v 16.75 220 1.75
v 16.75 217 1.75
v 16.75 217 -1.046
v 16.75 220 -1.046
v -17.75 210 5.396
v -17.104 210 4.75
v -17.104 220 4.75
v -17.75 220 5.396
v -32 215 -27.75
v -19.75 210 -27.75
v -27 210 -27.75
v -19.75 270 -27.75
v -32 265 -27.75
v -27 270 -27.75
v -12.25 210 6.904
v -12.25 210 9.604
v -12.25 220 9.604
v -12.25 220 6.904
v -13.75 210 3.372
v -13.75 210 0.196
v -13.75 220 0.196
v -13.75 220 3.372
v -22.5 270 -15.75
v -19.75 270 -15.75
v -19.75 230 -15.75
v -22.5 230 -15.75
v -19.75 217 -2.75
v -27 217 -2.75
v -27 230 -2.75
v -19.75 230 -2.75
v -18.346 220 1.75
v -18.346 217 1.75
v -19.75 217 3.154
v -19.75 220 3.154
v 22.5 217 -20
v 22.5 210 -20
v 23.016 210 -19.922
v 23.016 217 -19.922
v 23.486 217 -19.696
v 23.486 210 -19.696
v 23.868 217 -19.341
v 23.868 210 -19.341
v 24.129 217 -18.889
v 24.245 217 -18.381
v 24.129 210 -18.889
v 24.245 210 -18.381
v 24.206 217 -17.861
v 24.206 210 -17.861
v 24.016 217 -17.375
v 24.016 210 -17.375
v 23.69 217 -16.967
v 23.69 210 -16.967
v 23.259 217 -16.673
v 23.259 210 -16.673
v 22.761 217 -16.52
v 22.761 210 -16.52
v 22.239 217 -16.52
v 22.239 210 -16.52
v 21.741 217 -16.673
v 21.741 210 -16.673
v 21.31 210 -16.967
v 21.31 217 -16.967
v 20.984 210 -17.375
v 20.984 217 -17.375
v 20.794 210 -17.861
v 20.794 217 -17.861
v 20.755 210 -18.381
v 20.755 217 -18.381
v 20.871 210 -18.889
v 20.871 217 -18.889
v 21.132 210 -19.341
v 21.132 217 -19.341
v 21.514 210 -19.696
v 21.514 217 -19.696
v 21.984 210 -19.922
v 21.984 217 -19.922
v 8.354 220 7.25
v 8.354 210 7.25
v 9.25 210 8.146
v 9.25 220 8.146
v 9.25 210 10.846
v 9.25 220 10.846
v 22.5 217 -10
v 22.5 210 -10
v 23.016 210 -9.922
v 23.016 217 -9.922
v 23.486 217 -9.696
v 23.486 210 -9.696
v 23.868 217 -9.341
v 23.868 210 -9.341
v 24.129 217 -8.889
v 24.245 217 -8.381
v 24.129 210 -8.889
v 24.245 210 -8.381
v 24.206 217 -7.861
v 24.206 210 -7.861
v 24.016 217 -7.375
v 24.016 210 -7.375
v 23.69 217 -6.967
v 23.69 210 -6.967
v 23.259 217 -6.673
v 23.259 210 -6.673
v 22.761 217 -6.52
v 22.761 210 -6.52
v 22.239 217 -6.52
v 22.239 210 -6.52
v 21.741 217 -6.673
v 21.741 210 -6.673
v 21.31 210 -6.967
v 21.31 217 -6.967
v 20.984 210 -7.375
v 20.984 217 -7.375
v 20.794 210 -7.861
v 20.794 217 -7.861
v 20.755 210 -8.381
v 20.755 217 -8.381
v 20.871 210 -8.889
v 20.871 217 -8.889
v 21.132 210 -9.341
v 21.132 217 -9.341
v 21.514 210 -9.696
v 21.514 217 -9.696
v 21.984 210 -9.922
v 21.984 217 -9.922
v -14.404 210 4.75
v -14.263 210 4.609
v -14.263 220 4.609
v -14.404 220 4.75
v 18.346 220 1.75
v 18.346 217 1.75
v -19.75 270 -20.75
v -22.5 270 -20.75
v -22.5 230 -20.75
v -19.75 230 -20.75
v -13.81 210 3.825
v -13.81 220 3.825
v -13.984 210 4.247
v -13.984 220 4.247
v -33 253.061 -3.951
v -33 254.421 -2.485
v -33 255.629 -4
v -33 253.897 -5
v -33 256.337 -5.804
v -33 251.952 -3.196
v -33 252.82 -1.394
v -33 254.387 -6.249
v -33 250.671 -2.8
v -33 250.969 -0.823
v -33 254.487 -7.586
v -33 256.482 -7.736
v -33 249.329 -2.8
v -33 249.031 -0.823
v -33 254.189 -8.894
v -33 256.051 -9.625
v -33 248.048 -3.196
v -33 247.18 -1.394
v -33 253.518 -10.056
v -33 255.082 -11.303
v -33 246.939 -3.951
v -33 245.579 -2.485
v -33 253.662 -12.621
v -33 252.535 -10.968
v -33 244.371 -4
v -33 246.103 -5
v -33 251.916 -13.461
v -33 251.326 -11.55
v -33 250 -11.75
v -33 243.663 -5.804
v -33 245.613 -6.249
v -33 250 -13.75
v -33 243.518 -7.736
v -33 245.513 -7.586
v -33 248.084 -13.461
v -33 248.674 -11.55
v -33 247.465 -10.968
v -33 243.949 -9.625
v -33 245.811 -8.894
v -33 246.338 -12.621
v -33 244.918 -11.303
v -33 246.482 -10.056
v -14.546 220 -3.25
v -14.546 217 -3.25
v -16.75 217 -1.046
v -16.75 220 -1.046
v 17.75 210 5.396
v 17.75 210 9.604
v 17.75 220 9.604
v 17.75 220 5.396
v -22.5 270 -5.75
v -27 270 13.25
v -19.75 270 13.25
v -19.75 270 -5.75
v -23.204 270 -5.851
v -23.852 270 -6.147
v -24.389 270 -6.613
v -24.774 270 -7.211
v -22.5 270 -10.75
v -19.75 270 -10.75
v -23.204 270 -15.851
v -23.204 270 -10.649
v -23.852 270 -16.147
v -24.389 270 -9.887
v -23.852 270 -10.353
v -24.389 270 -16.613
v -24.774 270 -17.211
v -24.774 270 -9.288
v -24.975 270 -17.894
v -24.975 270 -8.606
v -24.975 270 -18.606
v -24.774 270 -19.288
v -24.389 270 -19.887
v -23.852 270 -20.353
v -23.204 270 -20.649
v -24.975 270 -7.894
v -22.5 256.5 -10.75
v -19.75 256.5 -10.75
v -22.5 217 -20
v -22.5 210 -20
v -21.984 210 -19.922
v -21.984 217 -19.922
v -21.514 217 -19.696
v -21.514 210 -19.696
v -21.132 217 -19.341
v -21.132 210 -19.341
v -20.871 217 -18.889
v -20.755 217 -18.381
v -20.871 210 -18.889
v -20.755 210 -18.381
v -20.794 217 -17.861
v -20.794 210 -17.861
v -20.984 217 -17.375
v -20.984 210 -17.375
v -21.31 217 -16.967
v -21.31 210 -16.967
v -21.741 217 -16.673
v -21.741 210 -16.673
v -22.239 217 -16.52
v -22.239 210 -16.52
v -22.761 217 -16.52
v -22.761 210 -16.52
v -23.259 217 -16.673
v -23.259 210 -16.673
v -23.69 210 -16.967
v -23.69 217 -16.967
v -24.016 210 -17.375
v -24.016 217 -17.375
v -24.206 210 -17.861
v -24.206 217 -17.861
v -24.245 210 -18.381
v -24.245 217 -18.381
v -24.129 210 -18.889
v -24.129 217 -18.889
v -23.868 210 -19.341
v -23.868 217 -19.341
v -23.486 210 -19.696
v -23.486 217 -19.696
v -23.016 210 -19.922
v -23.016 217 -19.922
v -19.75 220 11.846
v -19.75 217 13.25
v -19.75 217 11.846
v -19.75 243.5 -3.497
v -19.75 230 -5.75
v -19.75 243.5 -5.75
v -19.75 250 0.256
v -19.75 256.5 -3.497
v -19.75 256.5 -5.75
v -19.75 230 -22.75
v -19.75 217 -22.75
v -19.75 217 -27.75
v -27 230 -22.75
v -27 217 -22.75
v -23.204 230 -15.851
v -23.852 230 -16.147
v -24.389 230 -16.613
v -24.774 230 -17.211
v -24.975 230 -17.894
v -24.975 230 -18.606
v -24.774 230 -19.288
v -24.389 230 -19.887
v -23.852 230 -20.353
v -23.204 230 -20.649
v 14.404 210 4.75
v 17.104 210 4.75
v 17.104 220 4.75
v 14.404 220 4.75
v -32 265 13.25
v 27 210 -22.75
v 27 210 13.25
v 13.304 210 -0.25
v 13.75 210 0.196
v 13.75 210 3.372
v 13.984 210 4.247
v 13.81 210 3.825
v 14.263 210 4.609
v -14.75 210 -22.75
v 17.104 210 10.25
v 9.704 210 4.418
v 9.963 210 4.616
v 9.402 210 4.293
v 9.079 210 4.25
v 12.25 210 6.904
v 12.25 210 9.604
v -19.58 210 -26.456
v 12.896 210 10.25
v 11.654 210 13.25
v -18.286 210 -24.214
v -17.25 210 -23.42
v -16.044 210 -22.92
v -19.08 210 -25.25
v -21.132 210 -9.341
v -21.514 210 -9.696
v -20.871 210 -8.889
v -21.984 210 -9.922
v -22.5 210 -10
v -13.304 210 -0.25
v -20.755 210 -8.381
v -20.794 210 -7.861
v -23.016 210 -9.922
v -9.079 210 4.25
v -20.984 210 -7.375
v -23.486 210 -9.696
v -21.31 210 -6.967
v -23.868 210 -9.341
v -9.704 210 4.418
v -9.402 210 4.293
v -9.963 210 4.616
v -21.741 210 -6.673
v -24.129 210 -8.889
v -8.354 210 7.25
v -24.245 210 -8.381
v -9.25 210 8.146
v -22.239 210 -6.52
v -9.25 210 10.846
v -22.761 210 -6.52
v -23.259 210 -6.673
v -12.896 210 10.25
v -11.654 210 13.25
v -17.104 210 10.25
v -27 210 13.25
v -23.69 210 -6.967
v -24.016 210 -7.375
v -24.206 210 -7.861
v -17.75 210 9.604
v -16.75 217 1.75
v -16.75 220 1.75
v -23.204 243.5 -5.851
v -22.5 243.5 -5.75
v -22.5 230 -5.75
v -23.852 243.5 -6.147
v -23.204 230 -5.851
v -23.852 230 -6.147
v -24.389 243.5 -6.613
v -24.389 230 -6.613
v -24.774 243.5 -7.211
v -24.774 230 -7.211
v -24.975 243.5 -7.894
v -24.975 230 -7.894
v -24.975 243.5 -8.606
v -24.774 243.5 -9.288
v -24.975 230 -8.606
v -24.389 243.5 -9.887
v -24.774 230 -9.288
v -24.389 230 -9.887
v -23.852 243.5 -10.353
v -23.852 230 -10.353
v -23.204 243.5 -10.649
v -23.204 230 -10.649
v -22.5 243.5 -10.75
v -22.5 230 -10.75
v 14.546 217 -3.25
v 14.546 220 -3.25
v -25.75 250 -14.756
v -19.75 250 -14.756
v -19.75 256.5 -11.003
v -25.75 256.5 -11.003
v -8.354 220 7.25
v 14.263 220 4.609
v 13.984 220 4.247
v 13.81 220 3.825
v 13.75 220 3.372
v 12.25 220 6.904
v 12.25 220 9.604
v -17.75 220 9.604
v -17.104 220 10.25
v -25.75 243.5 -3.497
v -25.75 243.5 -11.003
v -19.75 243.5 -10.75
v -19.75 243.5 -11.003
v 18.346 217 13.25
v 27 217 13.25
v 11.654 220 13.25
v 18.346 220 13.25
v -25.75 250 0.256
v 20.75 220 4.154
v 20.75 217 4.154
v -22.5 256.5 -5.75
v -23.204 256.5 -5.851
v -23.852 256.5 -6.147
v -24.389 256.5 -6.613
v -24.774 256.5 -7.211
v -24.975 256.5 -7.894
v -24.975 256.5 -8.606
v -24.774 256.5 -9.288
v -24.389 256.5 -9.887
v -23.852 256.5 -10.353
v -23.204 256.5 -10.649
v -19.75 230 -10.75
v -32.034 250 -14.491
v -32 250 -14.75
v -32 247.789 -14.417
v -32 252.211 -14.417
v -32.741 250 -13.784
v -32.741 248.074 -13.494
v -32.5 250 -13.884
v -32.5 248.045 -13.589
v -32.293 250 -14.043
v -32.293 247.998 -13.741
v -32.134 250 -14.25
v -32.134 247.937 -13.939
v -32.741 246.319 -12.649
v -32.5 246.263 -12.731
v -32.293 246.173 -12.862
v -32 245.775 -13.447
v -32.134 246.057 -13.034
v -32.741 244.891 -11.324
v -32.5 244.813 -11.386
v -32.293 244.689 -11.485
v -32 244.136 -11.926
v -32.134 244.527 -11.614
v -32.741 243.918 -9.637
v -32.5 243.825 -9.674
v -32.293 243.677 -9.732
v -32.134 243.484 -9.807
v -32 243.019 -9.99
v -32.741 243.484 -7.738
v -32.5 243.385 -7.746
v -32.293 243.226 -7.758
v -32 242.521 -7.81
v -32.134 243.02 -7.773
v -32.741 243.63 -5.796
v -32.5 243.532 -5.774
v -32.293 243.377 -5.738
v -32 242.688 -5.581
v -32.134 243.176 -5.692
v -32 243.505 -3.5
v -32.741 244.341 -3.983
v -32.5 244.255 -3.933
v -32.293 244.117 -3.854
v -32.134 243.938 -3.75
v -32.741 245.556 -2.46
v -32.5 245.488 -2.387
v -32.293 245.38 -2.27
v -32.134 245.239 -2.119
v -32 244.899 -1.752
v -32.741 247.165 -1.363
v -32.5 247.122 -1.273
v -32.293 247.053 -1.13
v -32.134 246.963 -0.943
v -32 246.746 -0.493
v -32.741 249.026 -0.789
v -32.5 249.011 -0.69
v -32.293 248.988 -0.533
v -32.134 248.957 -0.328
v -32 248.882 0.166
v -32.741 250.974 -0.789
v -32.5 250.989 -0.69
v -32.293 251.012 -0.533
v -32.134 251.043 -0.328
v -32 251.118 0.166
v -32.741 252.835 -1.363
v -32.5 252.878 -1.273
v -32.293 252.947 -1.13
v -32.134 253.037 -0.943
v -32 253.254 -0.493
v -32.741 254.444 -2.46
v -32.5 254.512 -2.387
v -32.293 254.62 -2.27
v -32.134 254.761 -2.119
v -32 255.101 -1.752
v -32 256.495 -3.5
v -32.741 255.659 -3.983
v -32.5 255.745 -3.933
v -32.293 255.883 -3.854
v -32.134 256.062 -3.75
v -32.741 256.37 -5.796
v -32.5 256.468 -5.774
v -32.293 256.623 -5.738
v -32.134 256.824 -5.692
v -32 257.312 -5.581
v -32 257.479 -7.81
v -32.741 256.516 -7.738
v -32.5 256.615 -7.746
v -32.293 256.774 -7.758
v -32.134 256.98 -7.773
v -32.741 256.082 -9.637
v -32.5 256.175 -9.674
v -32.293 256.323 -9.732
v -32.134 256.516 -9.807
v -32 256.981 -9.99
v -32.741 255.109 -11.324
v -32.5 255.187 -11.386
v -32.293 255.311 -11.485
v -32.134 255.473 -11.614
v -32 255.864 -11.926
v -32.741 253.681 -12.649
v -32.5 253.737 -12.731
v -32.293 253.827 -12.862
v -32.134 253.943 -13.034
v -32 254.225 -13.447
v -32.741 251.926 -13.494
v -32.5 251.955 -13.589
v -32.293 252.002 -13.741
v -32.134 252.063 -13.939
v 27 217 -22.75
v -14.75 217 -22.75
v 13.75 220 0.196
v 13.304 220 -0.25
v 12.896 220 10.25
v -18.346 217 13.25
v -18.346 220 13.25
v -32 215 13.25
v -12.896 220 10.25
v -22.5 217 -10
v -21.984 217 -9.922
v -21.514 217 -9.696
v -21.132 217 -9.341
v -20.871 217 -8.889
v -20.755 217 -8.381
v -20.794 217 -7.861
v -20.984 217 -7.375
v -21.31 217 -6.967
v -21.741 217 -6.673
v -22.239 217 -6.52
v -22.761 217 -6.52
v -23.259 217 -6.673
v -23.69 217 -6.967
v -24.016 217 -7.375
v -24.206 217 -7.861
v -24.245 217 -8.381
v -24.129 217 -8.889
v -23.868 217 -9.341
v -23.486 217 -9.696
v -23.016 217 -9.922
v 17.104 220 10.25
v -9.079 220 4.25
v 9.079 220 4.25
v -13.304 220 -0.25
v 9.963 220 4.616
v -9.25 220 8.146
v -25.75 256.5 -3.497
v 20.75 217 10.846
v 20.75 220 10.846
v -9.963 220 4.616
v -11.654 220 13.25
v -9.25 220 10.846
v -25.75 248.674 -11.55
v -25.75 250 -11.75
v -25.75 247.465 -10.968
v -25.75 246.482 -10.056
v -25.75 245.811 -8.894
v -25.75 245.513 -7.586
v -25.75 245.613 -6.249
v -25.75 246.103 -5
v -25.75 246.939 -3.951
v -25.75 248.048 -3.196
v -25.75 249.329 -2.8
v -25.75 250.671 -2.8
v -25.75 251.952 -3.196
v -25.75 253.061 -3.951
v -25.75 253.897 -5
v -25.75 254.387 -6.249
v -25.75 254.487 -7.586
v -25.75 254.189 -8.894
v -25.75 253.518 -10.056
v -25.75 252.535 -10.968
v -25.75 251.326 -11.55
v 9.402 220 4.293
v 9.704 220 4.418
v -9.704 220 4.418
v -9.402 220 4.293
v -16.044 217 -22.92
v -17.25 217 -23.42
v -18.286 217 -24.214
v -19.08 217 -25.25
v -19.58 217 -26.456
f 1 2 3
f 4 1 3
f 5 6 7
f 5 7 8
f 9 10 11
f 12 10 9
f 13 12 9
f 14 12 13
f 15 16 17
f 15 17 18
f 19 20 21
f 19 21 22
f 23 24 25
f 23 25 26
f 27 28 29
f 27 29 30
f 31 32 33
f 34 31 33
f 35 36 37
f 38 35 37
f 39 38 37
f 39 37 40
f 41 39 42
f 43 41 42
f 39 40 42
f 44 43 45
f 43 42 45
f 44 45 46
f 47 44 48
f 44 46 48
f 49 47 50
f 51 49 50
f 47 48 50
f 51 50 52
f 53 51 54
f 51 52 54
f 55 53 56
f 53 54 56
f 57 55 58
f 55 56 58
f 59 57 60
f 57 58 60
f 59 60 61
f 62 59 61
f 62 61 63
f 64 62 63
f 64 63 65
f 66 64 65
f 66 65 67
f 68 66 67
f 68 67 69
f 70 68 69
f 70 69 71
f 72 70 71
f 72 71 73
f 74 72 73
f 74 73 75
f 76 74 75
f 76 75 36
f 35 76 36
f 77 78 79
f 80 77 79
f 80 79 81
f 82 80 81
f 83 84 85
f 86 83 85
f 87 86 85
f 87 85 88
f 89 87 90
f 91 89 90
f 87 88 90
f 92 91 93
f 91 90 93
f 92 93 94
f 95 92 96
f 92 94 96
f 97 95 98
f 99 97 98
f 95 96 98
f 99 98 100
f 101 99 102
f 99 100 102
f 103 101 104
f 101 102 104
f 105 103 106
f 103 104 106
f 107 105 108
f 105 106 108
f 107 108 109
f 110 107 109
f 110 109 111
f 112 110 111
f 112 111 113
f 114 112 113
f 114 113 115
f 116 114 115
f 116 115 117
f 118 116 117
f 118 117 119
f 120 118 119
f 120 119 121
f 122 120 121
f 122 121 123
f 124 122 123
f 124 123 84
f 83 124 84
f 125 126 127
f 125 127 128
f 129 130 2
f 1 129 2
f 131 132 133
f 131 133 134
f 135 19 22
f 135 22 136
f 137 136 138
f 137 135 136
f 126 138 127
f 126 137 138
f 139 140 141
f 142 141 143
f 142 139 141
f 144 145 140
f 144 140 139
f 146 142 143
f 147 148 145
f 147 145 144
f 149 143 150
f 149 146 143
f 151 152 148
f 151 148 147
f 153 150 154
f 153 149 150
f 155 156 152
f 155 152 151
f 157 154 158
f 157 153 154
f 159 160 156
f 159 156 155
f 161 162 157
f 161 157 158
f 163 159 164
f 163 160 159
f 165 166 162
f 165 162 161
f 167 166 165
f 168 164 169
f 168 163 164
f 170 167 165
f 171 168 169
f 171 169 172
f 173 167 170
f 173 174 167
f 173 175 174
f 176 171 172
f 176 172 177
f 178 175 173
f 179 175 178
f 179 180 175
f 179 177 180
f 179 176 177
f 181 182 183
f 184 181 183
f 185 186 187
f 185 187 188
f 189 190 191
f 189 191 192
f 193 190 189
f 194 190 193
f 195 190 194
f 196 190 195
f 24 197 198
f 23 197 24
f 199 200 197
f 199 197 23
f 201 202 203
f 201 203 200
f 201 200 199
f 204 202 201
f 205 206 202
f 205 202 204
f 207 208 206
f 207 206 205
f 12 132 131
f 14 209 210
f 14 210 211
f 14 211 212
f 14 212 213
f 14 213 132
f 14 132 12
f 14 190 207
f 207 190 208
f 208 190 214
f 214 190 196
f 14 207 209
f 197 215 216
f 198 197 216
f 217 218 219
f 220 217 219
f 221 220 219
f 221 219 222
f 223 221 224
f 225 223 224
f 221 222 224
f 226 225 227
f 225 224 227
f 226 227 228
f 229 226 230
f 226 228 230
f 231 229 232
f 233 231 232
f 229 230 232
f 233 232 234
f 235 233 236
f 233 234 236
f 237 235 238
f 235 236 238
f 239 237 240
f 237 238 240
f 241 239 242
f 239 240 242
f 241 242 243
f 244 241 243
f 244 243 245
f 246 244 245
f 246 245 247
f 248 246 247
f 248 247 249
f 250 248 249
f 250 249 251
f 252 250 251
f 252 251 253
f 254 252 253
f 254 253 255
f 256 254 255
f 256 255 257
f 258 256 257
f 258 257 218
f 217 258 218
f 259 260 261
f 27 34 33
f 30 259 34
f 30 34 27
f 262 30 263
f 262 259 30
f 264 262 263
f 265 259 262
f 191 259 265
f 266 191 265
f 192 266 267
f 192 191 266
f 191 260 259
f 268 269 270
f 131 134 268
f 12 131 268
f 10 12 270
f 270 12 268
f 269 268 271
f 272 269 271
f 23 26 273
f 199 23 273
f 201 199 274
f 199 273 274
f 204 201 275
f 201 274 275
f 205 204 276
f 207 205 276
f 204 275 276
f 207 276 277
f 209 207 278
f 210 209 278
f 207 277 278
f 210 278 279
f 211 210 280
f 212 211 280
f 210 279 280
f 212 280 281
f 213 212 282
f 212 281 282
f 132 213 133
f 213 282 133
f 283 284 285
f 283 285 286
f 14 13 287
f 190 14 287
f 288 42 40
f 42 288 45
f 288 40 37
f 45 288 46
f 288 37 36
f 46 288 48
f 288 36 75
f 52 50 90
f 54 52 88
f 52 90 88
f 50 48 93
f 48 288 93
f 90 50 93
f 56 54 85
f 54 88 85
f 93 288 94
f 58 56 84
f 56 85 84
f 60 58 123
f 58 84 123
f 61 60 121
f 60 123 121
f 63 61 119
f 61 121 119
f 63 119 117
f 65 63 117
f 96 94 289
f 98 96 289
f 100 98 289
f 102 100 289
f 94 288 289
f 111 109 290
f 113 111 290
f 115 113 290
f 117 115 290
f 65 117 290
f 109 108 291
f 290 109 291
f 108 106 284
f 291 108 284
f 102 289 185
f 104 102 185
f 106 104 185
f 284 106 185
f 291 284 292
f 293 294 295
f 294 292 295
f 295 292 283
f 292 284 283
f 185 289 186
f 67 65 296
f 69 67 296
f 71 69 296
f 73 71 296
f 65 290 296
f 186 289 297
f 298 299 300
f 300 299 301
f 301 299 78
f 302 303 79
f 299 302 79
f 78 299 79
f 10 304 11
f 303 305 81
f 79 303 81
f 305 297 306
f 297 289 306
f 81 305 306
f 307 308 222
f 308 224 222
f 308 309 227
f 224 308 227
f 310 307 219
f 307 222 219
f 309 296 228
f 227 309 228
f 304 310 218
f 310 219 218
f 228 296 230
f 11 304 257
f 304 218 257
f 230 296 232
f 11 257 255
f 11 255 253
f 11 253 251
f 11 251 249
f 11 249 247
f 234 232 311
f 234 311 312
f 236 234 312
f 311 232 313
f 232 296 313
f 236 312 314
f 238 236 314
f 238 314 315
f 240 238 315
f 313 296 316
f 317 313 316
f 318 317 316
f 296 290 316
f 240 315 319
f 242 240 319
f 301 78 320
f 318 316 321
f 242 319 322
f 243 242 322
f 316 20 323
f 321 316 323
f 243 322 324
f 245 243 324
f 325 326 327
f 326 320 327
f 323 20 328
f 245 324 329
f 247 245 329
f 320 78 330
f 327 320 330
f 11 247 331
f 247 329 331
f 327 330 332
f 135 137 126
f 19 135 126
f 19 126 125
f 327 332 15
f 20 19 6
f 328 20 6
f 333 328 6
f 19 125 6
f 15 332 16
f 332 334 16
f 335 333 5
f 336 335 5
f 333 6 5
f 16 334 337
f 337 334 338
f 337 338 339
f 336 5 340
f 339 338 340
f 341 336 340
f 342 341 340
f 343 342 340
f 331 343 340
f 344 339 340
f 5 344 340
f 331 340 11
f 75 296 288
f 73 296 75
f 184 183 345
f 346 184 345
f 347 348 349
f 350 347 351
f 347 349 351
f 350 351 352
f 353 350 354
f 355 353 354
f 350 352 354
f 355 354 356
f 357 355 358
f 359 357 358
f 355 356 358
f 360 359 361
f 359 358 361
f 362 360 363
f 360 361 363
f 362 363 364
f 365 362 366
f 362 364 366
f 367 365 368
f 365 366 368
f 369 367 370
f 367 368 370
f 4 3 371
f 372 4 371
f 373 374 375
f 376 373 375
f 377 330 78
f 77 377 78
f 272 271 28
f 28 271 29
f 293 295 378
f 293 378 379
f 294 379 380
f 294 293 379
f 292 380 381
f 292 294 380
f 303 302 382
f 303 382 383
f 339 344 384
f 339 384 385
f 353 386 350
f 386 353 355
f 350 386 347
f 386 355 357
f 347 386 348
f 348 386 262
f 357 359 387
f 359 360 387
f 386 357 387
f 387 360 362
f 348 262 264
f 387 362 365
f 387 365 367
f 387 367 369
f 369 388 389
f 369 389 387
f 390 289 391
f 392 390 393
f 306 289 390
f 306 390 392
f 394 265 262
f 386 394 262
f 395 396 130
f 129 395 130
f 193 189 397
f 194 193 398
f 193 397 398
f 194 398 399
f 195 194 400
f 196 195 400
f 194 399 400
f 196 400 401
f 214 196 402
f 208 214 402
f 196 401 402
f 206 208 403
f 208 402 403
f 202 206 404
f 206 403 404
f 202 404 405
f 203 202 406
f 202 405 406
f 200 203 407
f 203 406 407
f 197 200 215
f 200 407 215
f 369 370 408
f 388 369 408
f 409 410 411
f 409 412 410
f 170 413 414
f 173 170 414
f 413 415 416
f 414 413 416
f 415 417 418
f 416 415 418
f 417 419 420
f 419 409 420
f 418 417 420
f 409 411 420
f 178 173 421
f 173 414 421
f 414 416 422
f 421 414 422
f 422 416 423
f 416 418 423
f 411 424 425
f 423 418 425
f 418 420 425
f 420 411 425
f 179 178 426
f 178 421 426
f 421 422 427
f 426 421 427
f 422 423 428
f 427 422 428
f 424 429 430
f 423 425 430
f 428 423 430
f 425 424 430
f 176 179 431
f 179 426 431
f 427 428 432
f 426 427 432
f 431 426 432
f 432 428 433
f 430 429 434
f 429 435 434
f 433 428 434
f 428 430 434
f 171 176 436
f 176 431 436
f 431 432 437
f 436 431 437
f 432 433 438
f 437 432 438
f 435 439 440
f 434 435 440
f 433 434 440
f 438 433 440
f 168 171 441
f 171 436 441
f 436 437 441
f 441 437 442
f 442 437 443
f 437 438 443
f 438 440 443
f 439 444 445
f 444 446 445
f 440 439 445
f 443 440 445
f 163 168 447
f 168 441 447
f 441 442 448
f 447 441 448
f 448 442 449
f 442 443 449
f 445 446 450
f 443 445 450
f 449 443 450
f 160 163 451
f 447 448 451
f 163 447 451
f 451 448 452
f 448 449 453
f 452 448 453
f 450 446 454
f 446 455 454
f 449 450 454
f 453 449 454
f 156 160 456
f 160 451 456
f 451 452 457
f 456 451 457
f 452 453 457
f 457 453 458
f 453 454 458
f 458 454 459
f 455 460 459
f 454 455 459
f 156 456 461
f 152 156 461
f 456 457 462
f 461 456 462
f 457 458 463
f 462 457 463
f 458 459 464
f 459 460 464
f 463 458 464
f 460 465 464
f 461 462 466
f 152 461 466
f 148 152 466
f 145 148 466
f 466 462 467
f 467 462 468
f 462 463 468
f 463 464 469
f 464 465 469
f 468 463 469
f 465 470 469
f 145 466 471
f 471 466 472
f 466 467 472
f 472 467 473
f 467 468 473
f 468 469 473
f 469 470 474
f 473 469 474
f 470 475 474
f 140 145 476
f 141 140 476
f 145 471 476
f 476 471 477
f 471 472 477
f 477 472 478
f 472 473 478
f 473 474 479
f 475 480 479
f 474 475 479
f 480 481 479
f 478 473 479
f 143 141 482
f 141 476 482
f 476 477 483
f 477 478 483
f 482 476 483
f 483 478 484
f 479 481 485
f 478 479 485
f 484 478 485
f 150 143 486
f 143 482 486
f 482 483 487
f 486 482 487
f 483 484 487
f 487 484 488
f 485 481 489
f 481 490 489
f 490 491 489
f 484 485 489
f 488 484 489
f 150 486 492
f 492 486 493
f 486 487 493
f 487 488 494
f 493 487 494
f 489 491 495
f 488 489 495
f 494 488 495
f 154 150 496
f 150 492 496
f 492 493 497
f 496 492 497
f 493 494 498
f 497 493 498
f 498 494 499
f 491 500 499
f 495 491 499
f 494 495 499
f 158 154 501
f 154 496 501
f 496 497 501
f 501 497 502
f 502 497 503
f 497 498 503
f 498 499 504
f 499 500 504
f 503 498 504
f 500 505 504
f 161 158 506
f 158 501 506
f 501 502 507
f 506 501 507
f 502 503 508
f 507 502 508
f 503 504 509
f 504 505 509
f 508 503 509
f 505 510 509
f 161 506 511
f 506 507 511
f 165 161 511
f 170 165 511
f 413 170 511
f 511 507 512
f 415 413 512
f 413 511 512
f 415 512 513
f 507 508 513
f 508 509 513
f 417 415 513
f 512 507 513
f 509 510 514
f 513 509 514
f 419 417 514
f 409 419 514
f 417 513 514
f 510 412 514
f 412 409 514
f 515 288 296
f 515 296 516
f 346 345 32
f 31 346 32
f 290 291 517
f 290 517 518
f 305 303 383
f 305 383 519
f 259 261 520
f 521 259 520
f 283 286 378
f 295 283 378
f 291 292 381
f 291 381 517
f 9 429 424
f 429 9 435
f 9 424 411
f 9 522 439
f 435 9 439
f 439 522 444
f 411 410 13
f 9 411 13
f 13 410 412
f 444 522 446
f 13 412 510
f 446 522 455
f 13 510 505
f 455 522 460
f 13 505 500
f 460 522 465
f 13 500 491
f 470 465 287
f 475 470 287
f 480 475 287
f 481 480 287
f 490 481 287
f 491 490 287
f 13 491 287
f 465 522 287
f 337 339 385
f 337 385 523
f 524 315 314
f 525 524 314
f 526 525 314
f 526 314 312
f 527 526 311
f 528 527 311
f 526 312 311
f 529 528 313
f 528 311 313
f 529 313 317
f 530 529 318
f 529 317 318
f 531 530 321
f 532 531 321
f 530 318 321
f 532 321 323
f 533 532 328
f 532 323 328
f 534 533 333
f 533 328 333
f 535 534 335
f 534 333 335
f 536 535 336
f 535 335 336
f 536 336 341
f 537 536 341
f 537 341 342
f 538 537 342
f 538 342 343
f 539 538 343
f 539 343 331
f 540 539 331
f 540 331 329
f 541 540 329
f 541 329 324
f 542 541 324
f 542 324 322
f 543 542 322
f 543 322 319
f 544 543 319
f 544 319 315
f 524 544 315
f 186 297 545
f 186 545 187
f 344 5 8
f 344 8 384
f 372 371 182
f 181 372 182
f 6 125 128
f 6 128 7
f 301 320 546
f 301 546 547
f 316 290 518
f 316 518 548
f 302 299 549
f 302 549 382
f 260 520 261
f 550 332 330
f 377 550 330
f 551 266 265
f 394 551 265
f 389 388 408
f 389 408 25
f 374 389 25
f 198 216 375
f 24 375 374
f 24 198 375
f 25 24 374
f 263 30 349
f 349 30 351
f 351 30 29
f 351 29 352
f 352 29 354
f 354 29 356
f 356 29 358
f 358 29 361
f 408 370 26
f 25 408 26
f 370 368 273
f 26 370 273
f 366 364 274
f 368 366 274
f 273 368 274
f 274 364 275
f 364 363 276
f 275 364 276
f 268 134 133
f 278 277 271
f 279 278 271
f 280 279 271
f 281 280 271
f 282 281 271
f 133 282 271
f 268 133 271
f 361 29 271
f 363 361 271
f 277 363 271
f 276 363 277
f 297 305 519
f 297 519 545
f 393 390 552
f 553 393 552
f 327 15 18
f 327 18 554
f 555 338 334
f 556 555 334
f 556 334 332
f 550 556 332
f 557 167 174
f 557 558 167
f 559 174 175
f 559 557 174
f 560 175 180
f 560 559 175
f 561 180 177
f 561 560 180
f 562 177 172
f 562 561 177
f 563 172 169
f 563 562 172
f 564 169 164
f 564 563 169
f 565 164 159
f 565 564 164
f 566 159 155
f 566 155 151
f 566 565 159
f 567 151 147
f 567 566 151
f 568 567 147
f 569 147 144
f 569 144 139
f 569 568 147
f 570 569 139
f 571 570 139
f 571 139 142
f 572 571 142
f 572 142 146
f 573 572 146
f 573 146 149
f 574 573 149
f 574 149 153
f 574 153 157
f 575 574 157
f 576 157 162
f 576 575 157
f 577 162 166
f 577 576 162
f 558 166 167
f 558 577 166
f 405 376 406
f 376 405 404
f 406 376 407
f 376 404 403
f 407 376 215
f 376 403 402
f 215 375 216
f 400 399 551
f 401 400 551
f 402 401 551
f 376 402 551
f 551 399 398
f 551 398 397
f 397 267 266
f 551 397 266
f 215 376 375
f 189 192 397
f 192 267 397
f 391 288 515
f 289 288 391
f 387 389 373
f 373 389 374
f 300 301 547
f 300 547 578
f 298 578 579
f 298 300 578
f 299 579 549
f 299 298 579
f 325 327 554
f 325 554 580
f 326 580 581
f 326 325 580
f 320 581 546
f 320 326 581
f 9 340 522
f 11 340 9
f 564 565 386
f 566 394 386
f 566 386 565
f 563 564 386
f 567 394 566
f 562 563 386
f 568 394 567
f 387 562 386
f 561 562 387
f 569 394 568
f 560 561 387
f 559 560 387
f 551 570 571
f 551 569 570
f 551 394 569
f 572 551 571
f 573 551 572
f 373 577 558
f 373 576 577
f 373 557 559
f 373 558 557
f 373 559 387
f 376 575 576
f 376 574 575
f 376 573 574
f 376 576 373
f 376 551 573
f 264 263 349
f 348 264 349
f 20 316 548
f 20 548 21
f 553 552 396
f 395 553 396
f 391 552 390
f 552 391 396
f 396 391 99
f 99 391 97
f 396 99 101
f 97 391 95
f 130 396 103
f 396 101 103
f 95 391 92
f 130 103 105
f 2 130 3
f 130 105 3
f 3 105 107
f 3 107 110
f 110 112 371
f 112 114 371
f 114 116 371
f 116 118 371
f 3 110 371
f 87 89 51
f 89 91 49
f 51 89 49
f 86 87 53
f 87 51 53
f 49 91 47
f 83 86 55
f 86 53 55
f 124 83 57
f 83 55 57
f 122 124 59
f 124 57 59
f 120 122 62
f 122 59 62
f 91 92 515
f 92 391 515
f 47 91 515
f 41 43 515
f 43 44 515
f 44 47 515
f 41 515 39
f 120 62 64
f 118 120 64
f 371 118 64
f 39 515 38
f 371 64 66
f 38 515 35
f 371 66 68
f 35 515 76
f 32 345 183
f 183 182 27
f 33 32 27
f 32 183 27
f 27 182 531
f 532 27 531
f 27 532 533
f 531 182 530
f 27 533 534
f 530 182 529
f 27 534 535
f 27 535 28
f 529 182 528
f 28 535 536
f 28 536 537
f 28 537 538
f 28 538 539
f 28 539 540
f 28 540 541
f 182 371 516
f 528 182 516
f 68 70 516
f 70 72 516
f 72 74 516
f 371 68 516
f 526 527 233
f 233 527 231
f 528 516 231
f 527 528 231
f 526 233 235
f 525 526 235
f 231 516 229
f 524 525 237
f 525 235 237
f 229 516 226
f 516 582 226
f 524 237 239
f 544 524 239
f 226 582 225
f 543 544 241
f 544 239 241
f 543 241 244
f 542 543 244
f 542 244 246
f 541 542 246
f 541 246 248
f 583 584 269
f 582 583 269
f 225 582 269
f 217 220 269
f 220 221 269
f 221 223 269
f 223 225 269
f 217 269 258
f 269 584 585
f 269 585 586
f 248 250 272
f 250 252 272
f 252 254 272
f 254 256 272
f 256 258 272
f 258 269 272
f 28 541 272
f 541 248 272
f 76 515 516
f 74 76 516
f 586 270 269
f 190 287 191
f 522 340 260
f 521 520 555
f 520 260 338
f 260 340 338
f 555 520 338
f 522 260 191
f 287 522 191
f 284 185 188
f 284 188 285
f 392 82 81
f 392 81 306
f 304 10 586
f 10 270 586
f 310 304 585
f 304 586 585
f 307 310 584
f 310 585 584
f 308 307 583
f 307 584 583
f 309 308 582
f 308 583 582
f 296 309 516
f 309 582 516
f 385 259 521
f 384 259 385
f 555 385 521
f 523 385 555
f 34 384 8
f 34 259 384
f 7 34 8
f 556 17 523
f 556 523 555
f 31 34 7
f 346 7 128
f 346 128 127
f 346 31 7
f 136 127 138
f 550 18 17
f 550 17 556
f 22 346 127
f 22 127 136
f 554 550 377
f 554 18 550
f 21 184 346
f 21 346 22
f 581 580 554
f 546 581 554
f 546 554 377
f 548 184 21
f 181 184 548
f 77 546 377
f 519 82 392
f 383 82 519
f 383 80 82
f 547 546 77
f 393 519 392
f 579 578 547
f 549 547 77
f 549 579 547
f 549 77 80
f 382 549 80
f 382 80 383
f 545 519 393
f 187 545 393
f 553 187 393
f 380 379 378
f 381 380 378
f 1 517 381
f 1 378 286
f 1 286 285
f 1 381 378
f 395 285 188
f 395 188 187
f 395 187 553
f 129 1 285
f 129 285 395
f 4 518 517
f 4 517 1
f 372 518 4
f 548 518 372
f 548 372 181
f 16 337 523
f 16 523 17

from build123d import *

# Parameters (mm, degrees)
BOSS_EXTRUDE1_DEPTH = 400
BOSS_EXTRUDE2_DEPTH = 10
SKETCH3_R           = 43.000999871
CUT_EXTRUDE1_DEPTH  = 447.360216168
BOSS_EXTRUDE3_DEPTH = 7
SKETCH5_R           = 1.75
CUT_EXTRUDE2_DEPTH  = 33
SKETCH6_W           = 36.000000185
SKETCH6_H           = 60
BOSS_EXTRUDE4_DEPTH = 5
SKETCH7_W           = 7.24997928
SKETCH7_H           = 16
BOSS_EXTRUDE5_DEPTH = 53
SKETCH8_W           = 12.24997928
SKETCH8_H           = 60
BOSS_EXTRUDE6_DEPTH = 5
FILLET1_R           = 5
SKETCH10_W          = 20.000000185
SKETCH10_H          = 40
BOSS_EXTRUDE7_DEPTH = 7.24997928
CUT_EXTRUDE3_DEPTH  = 6
CUT_EXTRUDE4_DEPTH  = 68.845857758
SKETCH12_R          = 4.5
CUT_EXTRUDE5_DEPTH  = 16
CHAMFER2_SIZE       = 5
CHAMFER3_SIZE       = 5
SKETCH13_R          = 6.5
SKETCH13_R_2        = 4.5
BOSS_EXTRUDE8_DEPTH = 1
FILLET2_R           = 1


with BuildPart() as part:
    # Sketch1 → Boss-Extrude1 (new body)
    with BuildSketch(Plane(origin=(0, 200, 0), x_dir=(1, 0, 0), z_dir=(0, 1, 0))):
        with BuildLine():
            Line((1e-09, -3.855700002), (0.25, -4.00003757))
            Line((0.25, -4.00003757), (9.078700232, -4.00003757))
            ThreePointArc((9.078700232, -4.00003757), (9.652725366, -4.114218268), (10.139360377, -4.439377387))
            Line((10.139360377, -4.439377387), (12.500020747, -6.800037757))
            Line((12.500020747, -6.800037757), (12.500020747, -9.500037757))
            Line((12.500020747, -9.500037757), (13.00002072, -10.000037755))
            Line((13.00002072, -10.000037755), (17.00002072, -10.000037755))
            Line((17.00002072, -10.000037755), (17.500020747, -9.500037752))
            Line((17.500020747, -9.500037752), (17.500020747, -5.500037752))
            Line((17.500020747, -5.500037752), (17.00002075, -5.0000377))
            Line((17.00002075, -5.0000377), (14.30002072, -5.0000377))
            Line((14.30002072, -5.0000377), (14.085807141, -4.785824121))
            ThreePointArc((14.085807141, -4.785824121), (13.652261651, -4.136977442), (13.50002072, -3.371610598))
            Line((13.50002072, -3.371610598), (13.50002072, -0.30003757))
            Line((13.50002072, -0.30003757), (13.20002072, -3.757e-05))
            Line((13.20002072, -3.757e-05), (7.50002072, -3.757e-05))
            Line((7.50002072, -3.757e-05), (7.40002072, -0.10003757))
            Line((7.40002072, -0.10003757), (-7.40002072, -0.10003757))
            Line((-7.40002072, -0.10003757), (-7.50002072, -3.757e-05))
            Line((-7.50002072, -3.757e-05), (-13.20002072, -3.757e-05))
            Line((-13.20002072, -3.757e-05), (-13.50002072, -0.30003757))
            Line((-13.50002072, -0.30003757), (-13.50002072, -3.371610628))
            ThreePointArc((-13.50002072, -3.371610628), (-13.652261651, -4.136977472), (-14.085807141, -4.785824151))
            Line((-14.085807141, -4.785824151), (-14.30002069, -5.0000377))
            Line((-14.30002069, -5.0000377), (-17.00002072, -5.0000377))
            Line((-17.00002072, -5.0000377), (-17.50002072, -5.50003767))
            Line((-17.50002072, -5.50003767), (-17.50002072, -9.50003767))
            Line((-17.50002072, -9.50003767), (-17.000020665, -10.000037755))
            Line((-17.000020665, -10.000037755), (-13.00002072, -10.000037755))
            Line((-13.00002072, -10.000037755), (-12.500020741, -9.500037764))
            Line((-12.500020741, -9.500037764), (-12.500020741, -6.800037764))
            Line((-12.500020741, -6.800037764), (-10.139360364, -4.439377387))
            ThreePointArc((-10.139360364, -4.439377387), (-9.652725352, -4.114218268), (-9.078700218, -4.00003757))
            Line((-9.078700218, -4.00003757), (-0.25, -4.00003757))
            Line((-0.25, -4.00003757), (1e-09, -3.855700002))
        make_face()
    extrude(amount=-BOSS_EXTRUDE1_DEPTH)

    # Sketch3 → Cut-Extrude1 (cut)
    with BuildSketch(Plane(origin=(0, 200, 0), x_dir=(1, 0, 0), z_dir=(0, 1, 0))):
        with Locations((0, -0.10003757)):
            Circle(SKETCH3_R)
    extrude(amount=-CUT_EXTRUDE1_DEPTH, mode=Mode.SUBTRACT)


with BuildPart() as body_2:
    # Sketch2 → Boss-Extrude2 (new body)
    with BuildSketch(Plane(origin=(0, 210, 0), x_dir=(1, 0, 0), z_dir=(0, 1, 0))):
        Polygon((-8.353826469, -7.25003757), (8.353826482, -7.25003757), (9.250020747, -8.146231835), (9.250020747, -10.846231788), (11.653826595, -13.250037755), (18.34621475, -13.250037755), (20.750020747, -10.846231878), (20.750020747, -4.153843779), (18.346214932, -1.7500377), (16.75002072, -1.7500377), (16.75002072, 1.046156508), (14.546214798, 3.24996243), (-14.546214798, 3.24996243), (-16.75002072, 1.046156508), (-16.75002072, -1.7500377), (-18.346214741, -1.7500377), (-20.75002072, -4.153843535), (-20.75002072, -10.846231691), (-18.3462148, -13.250037755), (-11.653826621, -13.250037755), (-9.250020741, -10.846231821), (-9.250020741, -8.146231842), align=None)
        with BuildLine():
            Line((13.303574111, 0.24996243), (-13.303574111, 0.24996243))
            Line((-13.303574111, 0.24996243), (-13.75002072, -0.196484179))
            Line((-13.75002072, -0.196484179), (-13.75002072, -3.371610628))
            ThreePointArc((-13.75002072, -3.371610628), (-13.883231534, -4.041306614), (-14.262583837, -4.609047456))
            Line((-14.262583837, -4.609047456), (-14.403574081, -4.7500377))
            Line((-14.403574081, -4.7500377), (-17.103574106, -4.7500377))
            Line((-17.103574106, -4.7500377), (-17.75002072, -5.396484275))
            Line((-17.75002072, -5.396484275), (-17.75002072, -9.603591056))
            Line((-17.75002072, -9.603591056), (-17.10357406, -10.250037755))
            Line((-17.10357406, -10.250037755), (-12.896467328, -10.250037755))
            Line((-12.896467328, -10.250037755), (-12.250020741, -9.603591153))
            Line((-12.250020741, -9.603591153), (-12.250020741, -6.903591155))
            Line((-12.250020741, -6.903591155), (-9.962583668, -4.616154083))
            ThreePointArc((-9.962583668, -4.616154083), (-9.557054494, -4.345188152), (-9.078700218, -4.25003757))
            Line((-9.078700218, -4.25003757), (9.078700232, -4.25003757))
            ThreePointArc((9.078700232, -4.25003757), (9.557054508, -4.345188152), (9.962583682, -4.616154083))
            Line((9.962583682, -4.616154083), (12.250020747, -6.903591148))
            Line((12.250020747, -6.903591148), (12.250020747, -9.603591144))
            Line((12.250020747, -9.603591144), (12.896467326, -10.250037755))
            Line((12.896467326, -10.250037755), (17.103574107, -10.250037755))
            Line((17.103574107, -10.250037755), (17.750020747, -9.603591147))
            Line((17.750020747, -9.603591147), (17.750020747, -5.39648437))
            Line((17.750020747, -5.39648437), (17.103574149, -4.7500377))
            Line((17.103574149, -4.7500377), (14.403574111, -4.7500377))
            Line((14.403574111, -4.7500377), (14.262583837, -4.609047426))
            ThreePointArc((14.262583837, -4.609047426), (13.883231534, -4.041306584), (13.75002072, -3.371610598))
            Line((13.75002072, -3.371610598), (13.75002072, -0.196484179))
            Line((13.75002072, -0.196484179), (13.303574111, 0.24996243))
        make_face(mode=Mode.SUBTRACT)
    extrude(amount=BOSS_EXTRUDE2_DEPTH)

    # Sketch4 → Boss-Extrude3 (add)
    with BuildSketch(Plane(origin=(0, 210, 0), x_dir=(-1, 0, 0), z_dir=(0, -1, 0))):
        Polygon((27, -13.250037755), (27, 22.74996243), (-27, 22.74996243), (-27, -13.250037755), (-18.34621475, -13.250037755), (-20.750020747, -10.846231878), (-20.750020747, -4.153843779), (-18.346214932, -1.7500377), (-16.75002072, -1.7500377), (-16.75002072, 1.046156508), (-14.546214798, 3.24996243), (14.546214798, 3.24996243), (16.75002072, 1.046156508), (16.75002072, -1.7500377), (18.346214741, -1.7500377), (20.75002072, -4.153843535), (20.75002072, -10.846231691), (18.3462148, -13.250037755), align=None)
    extrude(amount=-BOSS_EXTRUDE3_DEPTH)

    # Sketch5 → Cut-Extrude2 (cut)
    with BuildSketch(Plane(origin=(0, 210, 0), x_dir=(-1, 0, 0), z_dir=(0, -1, 0))):
        with Locations(Location((22.5, 18.24996243, 0), (0, 0, 90))):
            Circle(SKETCH5_R)
        with Locations(Location((22.5, 8.24996243, 0), (0, 0, 90))):
            Circle(SKETCH5_R)
        with Locations(Location((-22.5, 8.24996243, 0), (0, 0, 90))):
            Circle(SKETCH5_R)
        with Locations(Location((-22.5, 18.24996243, 0), (0, 0, 90))):
            Circle(SKETCH5_R)
    extrude(amount=-CUT_EXTRUDE2_DEPTH, mode=Mode.SUBTRACT)

    # Sketch6 → Boss-Extrude4 (add)
    with BuildSketch(Plane.ZY.offset(27)):
        with Locations((-4.749962337, 240)):
            Rectangle(SKETCH6_W, SKETCH6_H)
    extrude(amount=BOSS_EXTRUDE4_DEPTH)

    # Sketch7 → Boss-Extrude5 (add)
    with BuildSketch(Plane(origin=(0, 217, 0), x_dir=(1, 0, 0), z_dir=(0, 1, 0))):
        with Locations((-23.37501036, -5.250037755)):
            Rectangle(SKETCH7_W, SKETCH7_H)
    extrude(amount=BOSS_EXTRUDE5_DEPTH)

    # Sketch8 → Boss-Extrude6 (add)
    with BuildSketch(Plane(origin=(0, 0, -22.74996243), x_dir=(-1, 0, 0), z_dir=(0, 0, -1))):
        with Locations((25.87501036, 240)):
            Rectangle(SKETCH8_W, SKETCH8_H)
    extrude(amount=BOSS_EXTRUDE6_DEPTH)

    # Fillet1
    fillet1_edges = [body_2.edges().sort_by_distance(p)[0] for p in [
        (-19.75002072, 213.5, -22.74996243),
    ]]
    fillet(fillet1_edges, radius=FILLET1_R - 0.0001)  # a hair under: the kernel refuses the full size

    # Sketch10 → Boss-Extrude7 (add)
    with BuildSketch(Plane(origin=(-27, 0, 0), x_dir=(0, 0, -1), z_dir=(1, 0, 0))):
        with Locations((12.749962337, 250)):
            Rectangle(SKETCH10_W, SKETCH10_H)
    extrude(amount=BOSS_EXTRUDE7_DEPTH)

    # Sketch9 → Cut-Extrude3 (cut)
    with BuildSketch(Plane(origin=(-19.75002072, 0, 0), x_dir=(0, 0, -1), z_dir=(1, 0, 0))):
        Polygon((14.755515837, 250), (11.002739087, 256.5), (3.497185588, 256.5), (-0.255591162, 250), (3.497185588, 243.5), (11.002739087, 243.5), align=None)
    extrude(amount=-CUT_EXTRUDE3_DEPTH, mode=Mode.SUBTRACT)

    # Sketch11 → Cut-Extrude4 (cut, through all)
    with BuildSketch(Plane(origin=(0, 217, 0), x_dir=(1, 0, 0), z_dir=(0, 1, 0))):
        with BuildLine():
            Line((-22.5, 20.74996243), (-17.824832595, 20.74996243))
            Line((-17.824832595, 20.74996243), (-17.824832595, 15.74996243))
            Line((-17.824832595, 15.74996243), (-22.5, 15.74996243))
            ThreePointArc((-22.5, 15.74996243), (-25, 18.24996243), (-22.5, 20.74996243))
        make_face()
        with BuildLine():
            Line((-22.5, 10.74996243), (-17.824832595, 10.74996243))
            Line((-17.824832595, 10.74996243), (-17.824832595, 5.74996243))
            Line((-17.824832595, 5.74996243), (-22.5, 5.74996243))
            ThreePointArc((-22.5, 5.74996243), (-25, 8.24996243), (-22.5, 10.74996243))
        make_face()
    extrude(amount=CUT_EXTRUDE4_DEPTH, mode=Mode.SUBTRACT)

    # Sketch12 → Cut-Extrude5 (cut)
    with BuildSketch(Plane(origin=(-25.75002072, 0, 0), x_dir=(0, 0, -1), z_dir=(1, 0, 0))):
        with Locations((7.249962338, 250)):
            Circle(SKETCH12_R)
    extrude(amount=-CUT_EXTRUDE5_DEPTH, mode=Mode.SUBTRACT)

    # Chamfer2
    chamfer2_edges = [body_2.edges().sort_by_distance(p)[0] for p in [
        (-32, 270, -7.249962337),
    ]]
    chamfer(chamfer2_edges, length=CHAMFER2_SIZE)

    # Chamfer3
    chamfer3_edges = [body_2.edges().sort_by_distance(p)[0] for p in [
        (-32, 210, -7.249962338),
    ]]
    chamfer(chamfer3_edges, length=CHAMFER3_SIZE)

    # Sketch13 → Boss-Extrude8 (add)
    with BuildSketch(Plane.ZY.offset(32)):
        with Locations(Location((-7.249962338, 250, 0), (0, 0, 180))):
            Circle(SKETCH13_R)
        with Locations(Location((-7.249962338, 250, 0), (0, 0, 180))):
            Circle(SKETCH13_R_2, mode=Mode.SUBTRACT)
    extrude(amount=BOSS_EXTRUDE8_DEPTH)

    # Fillet2
    fillet2_edges = [body_2.edges().sort_by_distance(p)[0] for p in [
        (-32, 250, -0.749962338),
    ]]
    fillet(fillet2_edges, radius=FILLET2_R - 0.0001)  # a hair under: the kernel refuses the full size


solid = body_2.part
